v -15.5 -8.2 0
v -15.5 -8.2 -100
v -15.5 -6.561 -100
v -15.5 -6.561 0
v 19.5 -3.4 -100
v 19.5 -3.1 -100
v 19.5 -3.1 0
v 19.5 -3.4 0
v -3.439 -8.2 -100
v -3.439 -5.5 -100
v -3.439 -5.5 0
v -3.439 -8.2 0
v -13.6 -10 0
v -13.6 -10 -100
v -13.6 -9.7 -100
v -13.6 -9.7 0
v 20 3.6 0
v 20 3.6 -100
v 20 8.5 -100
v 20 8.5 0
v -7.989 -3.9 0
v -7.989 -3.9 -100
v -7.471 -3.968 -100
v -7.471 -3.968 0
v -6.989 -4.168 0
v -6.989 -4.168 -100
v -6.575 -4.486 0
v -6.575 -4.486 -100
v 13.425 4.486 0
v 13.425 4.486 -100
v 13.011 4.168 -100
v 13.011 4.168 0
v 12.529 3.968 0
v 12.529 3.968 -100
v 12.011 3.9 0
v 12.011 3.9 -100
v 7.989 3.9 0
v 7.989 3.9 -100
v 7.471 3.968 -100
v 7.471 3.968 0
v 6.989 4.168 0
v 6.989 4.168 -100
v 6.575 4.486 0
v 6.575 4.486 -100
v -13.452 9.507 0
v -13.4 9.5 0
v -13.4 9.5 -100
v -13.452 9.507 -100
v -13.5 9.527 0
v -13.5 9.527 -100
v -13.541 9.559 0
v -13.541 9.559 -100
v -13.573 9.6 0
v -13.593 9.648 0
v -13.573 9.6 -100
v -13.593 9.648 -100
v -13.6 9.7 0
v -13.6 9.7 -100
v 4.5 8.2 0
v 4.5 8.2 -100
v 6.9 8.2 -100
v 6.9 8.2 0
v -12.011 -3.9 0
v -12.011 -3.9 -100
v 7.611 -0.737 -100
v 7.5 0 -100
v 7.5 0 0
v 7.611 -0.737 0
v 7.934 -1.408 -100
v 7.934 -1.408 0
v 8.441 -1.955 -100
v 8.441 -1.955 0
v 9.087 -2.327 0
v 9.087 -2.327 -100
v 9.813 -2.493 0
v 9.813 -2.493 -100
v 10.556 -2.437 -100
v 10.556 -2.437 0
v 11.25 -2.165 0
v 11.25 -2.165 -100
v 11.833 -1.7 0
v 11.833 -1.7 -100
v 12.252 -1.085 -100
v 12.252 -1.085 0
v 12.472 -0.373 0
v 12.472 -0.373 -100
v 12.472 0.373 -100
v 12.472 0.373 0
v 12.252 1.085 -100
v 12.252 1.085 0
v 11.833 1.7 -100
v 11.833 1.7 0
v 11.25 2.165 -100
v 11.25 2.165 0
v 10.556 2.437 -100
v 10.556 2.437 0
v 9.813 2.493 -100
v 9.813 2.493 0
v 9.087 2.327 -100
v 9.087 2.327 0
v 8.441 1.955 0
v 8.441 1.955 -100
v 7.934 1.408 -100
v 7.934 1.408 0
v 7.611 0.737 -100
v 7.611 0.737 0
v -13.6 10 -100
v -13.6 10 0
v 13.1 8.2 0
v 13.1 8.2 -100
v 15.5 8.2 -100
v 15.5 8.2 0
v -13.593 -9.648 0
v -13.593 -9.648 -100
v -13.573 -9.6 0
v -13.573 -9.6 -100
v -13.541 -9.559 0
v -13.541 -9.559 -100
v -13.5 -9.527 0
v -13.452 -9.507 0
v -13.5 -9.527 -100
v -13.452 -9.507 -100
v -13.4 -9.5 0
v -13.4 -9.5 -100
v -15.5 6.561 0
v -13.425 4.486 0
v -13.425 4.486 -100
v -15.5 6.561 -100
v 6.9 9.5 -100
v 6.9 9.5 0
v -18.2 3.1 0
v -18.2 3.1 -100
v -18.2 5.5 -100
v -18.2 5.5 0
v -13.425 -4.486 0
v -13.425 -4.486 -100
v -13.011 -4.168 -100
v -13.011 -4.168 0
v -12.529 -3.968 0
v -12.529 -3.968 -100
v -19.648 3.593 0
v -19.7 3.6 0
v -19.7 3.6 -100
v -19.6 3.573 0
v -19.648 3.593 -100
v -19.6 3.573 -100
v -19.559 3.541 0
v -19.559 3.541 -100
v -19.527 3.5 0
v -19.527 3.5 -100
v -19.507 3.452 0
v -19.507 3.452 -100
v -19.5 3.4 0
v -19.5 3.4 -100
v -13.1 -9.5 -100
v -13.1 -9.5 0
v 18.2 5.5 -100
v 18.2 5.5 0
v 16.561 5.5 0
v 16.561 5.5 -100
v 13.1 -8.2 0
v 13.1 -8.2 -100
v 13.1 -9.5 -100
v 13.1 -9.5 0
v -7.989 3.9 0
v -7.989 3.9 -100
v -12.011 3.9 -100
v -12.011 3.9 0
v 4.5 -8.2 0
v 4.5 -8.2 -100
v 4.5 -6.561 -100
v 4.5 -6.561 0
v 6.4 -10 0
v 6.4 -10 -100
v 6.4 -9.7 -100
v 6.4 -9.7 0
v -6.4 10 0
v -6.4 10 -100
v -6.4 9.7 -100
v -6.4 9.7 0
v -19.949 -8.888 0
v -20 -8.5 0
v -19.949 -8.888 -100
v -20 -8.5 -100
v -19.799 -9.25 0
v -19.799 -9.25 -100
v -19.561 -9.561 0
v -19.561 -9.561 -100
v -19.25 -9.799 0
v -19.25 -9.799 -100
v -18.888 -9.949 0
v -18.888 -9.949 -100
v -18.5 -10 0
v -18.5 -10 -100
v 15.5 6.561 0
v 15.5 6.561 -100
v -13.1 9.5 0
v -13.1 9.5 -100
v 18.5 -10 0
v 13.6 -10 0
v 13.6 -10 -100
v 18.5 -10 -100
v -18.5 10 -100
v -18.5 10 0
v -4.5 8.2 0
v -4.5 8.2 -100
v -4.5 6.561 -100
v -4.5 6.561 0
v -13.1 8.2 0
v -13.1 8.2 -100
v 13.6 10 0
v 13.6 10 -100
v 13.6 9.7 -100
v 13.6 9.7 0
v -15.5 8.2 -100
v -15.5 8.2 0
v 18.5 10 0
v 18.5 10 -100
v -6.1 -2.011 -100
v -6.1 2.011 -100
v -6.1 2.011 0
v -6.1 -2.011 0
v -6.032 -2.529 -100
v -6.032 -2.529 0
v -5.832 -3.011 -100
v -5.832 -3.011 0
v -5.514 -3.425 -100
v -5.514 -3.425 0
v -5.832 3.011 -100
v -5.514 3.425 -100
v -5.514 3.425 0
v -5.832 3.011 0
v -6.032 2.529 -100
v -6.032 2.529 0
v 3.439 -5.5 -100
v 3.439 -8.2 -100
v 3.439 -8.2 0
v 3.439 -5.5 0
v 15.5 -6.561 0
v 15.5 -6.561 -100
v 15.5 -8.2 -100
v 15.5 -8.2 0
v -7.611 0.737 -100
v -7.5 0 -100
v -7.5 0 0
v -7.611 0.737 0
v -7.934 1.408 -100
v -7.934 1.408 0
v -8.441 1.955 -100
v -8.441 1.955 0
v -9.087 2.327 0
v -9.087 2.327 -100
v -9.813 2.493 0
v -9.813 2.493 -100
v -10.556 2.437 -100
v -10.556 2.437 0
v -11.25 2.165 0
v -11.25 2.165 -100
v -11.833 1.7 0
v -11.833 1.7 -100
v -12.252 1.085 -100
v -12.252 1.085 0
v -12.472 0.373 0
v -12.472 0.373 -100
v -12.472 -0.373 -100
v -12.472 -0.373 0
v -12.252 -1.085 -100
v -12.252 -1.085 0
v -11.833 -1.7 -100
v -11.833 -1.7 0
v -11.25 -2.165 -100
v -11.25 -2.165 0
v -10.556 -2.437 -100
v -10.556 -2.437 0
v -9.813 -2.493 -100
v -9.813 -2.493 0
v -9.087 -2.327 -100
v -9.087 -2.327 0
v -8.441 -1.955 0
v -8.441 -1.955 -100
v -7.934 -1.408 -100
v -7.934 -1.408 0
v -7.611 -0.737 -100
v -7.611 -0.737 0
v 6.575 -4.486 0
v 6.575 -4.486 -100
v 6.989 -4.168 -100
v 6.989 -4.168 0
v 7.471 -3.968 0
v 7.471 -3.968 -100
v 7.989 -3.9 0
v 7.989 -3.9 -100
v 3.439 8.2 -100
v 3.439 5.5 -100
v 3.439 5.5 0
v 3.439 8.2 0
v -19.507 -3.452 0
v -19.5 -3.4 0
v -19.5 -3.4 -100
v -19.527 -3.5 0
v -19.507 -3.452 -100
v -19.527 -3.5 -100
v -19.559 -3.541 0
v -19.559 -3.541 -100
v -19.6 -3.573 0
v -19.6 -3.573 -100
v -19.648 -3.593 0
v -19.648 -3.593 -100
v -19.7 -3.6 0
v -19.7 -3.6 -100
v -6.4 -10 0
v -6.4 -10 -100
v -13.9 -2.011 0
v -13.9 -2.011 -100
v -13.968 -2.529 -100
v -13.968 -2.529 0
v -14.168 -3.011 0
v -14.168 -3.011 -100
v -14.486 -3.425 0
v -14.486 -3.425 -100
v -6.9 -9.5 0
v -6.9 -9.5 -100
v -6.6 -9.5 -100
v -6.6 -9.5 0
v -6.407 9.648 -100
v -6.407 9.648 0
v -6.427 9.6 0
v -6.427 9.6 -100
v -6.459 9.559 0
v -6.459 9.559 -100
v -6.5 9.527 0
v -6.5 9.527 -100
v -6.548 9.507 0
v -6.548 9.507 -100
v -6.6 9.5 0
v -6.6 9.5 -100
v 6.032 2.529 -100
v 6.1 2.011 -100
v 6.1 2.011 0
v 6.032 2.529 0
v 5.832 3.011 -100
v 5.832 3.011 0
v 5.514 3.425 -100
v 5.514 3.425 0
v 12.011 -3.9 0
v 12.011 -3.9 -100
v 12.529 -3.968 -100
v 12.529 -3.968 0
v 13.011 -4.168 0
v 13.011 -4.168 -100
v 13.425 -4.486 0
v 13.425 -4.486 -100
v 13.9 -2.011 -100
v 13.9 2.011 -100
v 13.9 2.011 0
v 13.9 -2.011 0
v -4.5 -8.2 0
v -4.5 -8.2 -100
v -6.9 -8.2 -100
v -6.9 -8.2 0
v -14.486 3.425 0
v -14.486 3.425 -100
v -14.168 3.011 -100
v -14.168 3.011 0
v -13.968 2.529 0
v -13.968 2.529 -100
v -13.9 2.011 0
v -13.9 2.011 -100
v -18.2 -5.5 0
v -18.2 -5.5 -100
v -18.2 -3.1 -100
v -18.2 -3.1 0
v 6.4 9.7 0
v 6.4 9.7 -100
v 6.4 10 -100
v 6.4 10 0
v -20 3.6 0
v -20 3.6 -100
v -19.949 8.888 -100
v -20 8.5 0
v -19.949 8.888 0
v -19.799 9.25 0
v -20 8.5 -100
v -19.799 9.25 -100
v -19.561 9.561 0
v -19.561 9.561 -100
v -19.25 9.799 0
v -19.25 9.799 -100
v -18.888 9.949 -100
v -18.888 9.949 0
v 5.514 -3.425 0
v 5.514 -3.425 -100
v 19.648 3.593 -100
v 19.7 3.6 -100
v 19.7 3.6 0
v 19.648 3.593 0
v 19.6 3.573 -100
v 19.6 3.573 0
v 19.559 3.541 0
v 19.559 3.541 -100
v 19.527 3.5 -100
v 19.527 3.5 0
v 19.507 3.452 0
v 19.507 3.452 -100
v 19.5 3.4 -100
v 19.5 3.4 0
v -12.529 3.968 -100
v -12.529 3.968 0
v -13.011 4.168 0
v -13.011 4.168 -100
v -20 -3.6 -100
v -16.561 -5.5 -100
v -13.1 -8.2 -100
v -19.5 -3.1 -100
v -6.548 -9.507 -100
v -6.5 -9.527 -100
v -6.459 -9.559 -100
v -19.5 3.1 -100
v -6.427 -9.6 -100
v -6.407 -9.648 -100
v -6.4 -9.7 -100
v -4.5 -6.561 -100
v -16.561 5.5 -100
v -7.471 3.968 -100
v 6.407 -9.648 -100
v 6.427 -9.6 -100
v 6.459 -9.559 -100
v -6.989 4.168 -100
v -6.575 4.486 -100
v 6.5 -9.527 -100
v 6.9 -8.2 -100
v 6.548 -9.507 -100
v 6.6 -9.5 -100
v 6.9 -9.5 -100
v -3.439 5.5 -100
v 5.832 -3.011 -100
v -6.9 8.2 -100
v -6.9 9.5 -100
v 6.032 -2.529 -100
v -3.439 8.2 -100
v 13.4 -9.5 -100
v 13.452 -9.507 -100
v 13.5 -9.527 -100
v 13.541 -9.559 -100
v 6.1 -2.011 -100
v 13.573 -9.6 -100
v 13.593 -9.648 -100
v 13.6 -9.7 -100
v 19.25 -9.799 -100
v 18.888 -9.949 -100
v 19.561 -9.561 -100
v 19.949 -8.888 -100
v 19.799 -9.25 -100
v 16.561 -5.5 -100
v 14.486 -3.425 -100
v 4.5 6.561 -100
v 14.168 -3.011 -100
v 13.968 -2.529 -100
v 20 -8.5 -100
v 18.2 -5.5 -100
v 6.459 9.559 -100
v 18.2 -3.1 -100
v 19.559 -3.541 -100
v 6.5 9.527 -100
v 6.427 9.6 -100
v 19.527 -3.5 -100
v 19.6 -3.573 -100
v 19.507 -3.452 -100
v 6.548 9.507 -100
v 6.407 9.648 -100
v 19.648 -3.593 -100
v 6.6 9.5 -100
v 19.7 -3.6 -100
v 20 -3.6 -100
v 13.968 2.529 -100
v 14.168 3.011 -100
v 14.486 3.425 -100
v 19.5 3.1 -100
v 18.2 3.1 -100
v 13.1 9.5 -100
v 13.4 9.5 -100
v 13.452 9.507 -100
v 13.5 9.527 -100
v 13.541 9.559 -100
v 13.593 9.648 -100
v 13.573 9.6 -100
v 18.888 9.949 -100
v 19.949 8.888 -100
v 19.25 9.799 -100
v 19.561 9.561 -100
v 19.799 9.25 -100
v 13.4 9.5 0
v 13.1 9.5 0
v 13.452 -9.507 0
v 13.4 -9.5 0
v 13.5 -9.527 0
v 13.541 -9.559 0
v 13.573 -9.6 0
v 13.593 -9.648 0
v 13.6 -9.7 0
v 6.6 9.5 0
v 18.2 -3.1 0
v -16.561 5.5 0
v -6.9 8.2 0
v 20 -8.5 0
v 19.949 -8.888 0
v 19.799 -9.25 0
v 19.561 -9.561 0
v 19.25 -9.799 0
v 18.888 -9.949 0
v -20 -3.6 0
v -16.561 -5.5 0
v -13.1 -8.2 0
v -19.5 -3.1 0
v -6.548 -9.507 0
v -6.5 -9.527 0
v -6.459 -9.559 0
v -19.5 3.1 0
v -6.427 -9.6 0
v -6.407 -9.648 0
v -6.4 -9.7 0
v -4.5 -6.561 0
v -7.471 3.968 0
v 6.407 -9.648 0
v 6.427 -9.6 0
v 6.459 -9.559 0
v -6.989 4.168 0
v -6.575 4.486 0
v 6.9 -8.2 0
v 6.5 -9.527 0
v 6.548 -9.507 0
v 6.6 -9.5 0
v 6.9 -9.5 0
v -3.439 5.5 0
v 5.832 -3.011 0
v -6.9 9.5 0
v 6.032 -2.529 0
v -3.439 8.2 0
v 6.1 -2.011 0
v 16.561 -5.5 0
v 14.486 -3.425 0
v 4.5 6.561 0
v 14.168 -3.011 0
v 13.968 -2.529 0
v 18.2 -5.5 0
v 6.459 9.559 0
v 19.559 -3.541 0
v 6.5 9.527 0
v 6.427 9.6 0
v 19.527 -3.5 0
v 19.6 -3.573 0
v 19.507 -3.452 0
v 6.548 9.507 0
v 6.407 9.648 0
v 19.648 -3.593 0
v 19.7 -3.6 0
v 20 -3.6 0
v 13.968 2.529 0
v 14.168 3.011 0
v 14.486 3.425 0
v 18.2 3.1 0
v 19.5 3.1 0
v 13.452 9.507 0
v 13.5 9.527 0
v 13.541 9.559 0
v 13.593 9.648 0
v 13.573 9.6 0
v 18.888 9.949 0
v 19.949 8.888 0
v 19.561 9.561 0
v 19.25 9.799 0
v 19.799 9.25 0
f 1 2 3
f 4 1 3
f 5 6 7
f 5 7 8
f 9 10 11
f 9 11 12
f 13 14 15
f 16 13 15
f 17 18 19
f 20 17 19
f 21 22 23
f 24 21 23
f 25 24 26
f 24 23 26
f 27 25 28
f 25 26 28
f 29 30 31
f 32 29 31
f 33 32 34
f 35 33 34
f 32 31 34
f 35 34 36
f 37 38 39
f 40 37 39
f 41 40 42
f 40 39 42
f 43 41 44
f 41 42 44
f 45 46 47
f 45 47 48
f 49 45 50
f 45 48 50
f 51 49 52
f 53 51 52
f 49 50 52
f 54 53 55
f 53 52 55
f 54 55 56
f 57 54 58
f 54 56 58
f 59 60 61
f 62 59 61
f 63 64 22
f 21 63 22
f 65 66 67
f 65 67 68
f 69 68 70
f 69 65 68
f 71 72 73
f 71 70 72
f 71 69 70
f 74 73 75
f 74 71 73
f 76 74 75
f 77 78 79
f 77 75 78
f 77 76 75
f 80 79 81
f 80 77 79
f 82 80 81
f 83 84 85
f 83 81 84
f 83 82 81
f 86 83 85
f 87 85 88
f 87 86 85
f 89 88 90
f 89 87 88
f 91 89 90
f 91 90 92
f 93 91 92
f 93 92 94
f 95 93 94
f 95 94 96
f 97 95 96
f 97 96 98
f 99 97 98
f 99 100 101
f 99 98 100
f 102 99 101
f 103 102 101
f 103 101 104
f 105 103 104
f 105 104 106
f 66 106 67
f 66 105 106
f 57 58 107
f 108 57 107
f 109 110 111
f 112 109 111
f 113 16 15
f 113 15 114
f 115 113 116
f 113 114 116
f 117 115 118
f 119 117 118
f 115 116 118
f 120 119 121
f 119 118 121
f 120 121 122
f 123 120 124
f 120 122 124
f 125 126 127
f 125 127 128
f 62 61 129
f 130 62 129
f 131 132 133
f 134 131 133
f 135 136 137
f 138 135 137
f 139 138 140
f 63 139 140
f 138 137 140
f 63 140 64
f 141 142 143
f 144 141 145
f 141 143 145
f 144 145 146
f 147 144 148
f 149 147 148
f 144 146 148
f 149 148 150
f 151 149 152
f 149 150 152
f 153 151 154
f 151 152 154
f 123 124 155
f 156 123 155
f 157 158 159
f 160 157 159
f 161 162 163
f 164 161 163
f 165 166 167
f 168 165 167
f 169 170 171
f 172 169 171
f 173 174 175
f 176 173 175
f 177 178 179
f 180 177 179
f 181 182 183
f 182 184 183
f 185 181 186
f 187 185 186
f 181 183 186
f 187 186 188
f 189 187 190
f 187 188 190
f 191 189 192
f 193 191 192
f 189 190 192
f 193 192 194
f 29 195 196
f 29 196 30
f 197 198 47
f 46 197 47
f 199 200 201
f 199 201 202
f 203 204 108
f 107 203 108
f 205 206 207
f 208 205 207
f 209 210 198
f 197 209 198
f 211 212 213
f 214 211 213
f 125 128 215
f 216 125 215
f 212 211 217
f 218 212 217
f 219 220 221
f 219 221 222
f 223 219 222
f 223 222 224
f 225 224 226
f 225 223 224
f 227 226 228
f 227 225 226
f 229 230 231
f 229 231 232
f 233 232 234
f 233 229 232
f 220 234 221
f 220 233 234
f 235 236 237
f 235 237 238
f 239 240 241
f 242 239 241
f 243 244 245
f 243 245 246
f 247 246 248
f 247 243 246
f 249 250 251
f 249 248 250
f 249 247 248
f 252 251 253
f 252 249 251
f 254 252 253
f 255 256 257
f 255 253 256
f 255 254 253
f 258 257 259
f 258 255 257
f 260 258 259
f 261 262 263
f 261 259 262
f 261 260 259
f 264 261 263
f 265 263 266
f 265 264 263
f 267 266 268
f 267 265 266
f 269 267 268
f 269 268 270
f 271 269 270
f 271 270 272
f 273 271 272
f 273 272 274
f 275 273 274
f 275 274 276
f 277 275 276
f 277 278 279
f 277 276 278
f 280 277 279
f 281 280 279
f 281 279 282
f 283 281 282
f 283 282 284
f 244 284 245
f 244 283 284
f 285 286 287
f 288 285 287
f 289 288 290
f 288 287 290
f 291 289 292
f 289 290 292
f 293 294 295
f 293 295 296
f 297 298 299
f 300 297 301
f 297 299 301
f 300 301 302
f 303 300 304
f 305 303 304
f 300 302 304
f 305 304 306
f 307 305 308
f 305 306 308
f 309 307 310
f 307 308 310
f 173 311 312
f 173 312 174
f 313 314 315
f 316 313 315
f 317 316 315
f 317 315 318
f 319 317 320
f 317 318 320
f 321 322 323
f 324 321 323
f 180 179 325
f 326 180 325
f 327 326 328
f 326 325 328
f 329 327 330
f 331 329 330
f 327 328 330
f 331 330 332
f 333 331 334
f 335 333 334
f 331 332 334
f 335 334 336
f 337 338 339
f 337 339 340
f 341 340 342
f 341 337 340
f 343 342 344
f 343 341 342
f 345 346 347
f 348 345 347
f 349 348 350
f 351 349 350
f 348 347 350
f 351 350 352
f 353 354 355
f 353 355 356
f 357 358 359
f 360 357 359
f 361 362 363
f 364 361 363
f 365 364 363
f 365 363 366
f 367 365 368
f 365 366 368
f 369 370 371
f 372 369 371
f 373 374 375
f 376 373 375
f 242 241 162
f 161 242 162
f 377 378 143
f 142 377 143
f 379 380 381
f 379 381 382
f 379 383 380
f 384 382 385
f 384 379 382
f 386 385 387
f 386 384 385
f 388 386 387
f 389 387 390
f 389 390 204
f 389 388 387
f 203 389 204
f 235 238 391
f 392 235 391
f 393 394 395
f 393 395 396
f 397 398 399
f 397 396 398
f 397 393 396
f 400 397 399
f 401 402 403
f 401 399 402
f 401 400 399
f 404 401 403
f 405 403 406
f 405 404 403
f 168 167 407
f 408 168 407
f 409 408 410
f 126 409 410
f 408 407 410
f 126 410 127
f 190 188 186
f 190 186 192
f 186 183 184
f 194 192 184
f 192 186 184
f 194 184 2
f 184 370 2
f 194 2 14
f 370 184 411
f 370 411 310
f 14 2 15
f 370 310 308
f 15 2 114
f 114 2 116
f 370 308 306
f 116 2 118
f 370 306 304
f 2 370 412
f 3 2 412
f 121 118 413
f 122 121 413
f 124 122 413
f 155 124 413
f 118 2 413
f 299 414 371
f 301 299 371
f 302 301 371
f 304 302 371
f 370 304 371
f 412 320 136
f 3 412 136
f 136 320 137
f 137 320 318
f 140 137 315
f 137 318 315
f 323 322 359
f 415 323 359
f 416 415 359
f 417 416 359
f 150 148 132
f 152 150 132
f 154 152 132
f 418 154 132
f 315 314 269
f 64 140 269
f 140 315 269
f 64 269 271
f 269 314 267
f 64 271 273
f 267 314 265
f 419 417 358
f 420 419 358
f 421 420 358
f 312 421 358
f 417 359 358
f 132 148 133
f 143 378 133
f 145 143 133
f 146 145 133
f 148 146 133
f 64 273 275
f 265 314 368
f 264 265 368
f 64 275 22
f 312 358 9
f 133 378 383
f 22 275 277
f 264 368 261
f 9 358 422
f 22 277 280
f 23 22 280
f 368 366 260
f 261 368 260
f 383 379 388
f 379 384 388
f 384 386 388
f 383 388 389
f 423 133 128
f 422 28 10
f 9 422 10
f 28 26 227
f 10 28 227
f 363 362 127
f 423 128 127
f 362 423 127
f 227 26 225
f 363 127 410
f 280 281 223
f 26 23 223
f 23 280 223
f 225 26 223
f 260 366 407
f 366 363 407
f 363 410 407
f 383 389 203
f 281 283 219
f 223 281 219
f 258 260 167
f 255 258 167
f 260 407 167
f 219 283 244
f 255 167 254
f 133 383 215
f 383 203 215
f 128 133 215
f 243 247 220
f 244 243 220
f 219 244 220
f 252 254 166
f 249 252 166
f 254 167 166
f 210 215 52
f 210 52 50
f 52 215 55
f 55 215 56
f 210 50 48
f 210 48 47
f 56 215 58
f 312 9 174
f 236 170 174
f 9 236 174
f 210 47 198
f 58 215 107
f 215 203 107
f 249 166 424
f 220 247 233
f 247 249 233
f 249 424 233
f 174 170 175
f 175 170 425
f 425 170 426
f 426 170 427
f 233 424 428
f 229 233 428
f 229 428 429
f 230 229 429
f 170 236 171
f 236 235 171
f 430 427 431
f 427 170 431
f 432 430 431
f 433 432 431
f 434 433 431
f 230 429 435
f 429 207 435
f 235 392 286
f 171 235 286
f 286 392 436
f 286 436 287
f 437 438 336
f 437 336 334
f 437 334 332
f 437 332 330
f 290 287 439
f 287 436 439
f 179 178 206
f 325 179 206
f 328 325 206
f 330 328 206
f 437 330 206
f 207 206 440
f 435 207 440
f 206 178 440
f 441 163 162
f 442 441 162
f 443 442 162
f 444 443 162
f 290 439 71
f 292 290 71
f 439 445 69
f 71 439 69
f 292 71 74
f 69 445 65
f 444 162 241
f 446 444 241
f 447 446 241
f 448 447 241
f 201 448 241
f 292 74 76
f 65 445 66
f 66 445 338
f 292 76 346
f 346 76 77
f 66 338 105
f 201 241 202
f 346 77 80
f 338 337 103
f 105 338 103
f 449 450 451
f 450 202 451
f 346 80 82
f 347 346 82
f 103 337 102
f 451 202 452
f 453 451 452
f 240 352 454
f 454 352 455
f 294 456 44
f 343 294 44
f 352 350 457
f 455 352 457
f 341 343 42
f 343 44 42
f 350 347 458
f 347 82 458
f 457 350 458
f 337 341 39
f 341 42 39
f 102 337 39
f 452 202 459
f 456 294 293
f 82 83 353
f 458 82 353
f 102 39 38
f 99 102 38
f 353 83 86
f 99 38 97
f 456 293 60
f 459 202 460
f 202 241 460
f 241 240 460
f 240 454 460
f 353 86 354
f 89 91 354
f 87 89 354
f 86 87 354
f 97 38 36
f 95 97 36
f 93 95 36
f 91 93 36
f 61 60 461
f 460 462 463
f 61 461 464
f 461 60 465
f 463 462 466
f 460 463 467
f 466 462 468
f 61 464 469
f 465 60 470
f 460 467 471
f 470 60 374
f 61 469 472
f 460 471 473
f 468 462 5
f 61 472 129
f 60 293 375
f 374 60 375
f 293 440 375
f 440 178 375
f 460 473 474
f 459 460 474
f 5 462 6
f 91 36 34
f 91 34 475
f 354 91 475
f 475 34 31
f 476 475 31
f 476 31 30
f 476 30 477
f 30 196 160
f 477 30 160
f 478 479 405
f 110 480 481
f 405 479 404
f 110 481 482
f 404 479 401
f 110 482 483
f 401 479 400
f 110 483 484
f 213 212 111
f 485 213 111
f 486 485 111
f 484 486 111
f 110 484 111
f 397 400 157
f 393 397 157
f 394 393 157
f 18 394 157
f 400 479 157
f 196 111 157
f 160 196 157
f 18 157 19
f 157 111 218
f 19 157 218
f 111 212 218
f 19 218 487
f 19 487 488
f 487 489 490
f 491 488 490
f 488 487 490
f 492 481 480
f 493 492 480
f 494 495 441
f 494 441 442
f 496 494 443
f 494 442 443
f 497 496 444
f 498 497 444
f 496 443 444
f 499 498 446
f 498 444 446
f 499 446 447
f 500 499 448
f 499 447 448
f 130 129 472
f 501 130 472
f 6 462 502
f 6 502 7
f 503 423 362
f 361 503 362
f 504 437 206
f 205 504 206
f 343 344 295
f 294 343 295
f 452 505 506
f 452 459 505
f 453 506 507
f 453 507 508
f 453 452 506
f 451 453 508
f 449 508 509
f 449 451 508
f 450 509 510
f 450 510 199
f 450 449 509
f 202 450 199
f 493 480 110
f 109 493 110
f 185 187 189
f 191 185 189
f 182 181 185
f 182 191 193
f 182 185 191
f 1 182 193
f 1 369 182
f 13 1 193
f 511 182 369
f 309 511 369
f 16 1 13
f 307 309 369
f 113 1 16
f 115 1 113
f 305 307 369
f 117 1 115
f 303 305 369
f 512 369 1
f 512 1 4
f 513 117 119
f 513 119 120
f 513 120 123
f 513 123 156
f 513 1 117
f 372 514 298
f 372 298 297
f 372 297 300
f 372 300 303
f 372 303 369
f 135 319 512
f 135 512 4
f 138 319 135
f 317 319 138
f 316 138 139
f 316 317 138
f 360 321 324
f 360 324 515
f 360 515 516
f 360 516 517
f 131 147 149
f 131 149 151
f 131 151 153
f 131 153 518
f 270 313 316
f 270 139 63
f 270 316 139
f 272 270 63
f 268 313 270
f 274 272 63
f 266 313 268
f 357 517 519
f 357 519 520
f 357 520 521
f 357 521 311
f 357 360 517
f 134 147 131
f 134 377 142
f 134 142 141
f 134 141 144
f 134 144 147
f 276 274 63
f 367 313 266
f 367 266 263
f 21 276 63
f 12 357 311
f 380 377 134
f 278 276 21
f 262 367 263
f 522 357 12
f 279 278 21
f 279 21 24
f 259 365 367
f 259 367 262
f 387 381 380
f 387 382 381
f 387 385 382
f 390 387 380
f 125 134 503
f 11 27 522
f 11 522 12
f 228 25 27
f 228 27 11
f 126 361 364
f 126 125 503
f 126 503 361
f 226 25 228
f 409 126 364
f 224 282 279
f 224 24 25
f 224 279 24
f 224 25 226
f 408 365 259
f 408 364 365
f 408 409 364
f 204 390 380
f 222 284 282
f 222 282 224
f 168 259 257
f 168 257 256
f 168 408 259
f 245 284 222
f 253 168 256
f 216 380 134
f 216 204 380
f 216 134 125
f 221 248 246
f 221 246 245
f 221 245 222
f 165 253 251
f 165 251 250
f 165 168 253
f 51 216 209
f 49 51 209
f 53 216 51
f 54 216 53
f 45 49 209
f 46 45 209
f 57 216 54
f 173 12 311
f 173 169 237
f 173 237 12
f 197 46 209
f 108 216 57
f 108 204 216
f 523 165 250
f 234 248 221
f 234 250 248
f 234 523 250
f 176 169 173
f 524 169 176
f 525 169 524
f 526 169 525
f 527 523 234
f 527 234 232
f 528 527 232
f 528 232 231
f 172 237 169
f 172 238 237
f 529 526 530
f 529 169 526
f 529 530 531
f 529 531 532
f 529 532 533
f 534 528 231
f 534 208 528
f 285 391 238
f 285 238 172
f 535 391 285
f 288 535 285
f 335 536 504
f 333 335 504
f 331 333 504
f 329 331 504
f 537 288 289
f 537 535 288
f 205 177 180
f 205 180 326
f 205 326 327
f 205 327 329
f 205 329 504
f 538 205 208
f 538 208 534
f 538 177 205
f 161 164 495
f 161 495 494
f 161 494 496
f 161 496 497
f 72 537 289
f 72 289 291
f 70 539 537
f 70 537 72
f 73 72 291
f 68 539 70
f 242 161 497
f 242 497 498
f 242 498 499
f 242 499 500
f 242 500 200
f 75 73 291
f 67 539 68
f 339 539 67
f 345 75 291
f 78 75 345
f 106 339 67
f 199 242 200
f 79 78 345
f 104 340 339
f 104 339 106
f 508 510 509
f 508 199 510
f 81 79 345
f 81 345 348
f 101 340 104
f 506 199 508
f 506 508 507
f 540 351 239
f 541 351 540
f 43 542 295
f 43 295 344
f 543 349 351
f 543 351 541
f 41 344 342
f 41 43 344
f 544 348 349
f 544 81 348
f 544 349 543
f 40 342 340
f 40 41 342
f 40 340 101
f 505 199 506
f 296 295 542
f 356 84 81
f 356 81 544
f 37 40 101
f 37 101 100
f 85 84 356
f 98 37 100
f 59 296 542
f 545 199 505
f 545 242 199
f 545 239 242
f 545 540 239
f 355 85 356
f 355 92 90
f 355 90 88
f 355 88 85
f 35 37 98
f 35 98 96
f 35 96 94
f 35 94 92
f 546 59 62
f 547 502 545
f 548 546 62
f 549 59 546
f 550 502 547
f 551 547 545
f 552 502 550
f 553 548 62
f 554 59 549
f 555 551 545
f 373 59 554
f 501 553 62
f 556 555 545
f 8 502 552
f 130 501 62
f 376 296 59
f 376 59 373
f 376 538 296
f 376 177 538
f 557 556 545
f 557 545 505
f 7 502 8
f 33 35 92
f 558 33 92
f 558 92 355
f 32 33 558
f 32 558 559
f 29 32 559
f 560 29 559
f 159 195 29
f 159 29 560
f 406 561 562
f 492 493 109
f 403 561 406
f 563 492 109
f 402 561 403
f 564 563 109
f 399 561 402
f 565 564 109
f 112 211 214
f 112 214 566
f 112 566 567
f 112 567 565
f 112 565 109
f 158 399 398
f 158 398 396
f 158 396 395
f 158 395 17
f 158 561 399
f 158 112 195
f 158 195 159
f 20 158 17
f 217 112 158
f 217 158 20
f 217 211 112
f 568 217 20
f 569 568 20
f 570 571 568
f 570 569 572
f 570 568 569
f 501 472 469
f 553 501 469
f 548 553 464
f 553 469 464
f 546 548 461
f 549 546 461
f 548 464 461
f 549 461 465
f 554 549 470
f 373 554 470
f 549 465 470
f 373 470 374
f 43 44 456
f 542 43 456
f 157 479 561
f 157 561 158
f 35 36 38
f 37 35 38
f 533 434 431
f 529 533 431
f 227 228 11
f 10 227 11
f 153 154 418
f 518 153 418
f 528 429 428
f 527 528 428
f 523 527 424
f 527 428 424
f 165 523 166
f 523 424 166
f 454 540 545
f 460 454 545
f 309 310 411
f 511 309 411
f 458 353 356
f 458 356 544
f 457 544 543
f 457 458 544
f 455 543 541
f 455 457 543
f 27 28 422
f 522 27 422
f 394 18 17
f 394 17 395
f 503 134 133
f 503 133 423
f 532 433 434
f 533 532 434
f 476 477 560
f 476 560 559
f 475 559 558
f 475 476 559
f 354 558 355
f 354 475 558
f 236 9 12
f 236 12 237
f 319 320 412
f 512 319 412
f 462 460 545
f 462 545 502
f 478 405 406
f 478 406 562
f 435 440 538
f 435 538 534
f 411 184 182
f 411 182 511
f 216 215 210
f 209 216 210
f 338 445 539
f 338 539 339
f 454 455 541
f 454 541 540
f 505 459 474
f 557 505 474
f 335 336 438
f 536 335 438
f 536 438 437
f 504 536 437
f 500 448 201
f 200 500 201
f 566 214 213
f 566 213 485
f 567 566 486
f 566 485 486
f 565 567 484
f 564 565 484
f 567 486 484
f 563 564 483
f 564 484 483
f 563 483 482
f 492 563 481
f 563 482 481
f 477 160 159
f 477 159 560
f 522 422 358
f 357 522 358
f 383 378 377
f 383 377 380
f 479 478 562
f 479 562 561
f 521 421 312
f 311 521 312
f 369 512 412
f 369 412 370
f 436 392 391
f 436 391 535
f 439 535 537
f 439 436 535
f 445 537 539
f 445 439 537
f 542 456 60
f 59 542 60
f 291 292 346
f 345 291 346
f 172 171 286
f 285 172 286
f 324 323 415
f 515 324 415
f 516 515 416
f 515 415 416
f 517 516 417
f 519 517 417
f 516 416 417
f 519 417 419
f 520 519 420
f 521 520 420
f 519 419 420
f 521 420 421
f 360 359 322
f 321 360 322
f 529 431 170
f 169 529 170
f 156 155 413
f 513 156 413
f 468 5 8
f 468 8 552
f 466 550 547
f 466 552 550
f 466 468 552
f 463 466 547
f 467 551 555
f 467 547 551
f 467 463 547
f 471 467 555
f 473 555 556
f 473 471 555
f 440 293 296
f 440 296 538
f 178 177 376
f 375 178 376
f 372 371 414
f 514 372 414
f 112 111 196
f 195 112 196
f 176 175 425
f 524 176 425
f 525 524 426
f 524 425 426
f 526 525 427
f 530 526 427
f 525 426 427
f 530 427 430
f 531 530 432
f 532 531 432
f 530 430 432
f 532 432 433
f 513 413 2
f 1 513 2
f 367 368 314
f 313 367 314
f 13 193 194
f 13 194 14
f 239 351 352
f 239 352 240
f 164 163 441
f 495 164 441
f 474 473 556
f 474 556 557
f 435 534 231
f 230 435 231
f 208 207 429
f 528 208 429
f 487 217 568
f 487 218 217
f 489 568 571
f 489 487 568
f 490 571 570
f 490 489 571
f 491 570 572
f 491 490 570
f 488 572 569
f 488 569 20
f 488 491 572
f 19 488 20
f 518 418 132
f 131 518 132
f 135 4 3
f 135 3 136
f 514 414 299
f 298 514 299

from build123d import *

# Parameters (mm, degrees)
SKETCH2_W               = 40
SKETCH2_H               = 20
BOSS_EXTRUDE1_DEPTH     = 100
CUT_EXTRUDE1_DEPTH      = 103.46950766
CUT_EXTRUDE1_DEPTH_BACK = 103.46950766
SKETCH3_R               = 2.5
FILLET1_R               = 1.5


with BuildPart() as part:
    # Sketch2 → Boss-Extrude1 (new body)
    with BuildSketch(Plane.XY):
        Rectangle(SKETCH2_W, SKETCH2_H)
    extrude(amount=-BOSS_EXTRUDE1_DEPTH)

    # Sketch3 → Cut-Extrude1 (cut, two sides: drawn at the far end of the back side and taken through both)
    with BuildSketch(Plane.XY.offset(-CUT_EXTRUDE1_DEPTH_BACK)):
        with Locations((-10, 0)):
            Circle(SKETCH3_R)
        with Locations(Location((10, 0, 0), (0, 0, 180))):
            Circle(SKETCH3_R)
        with BuildLine():
            Line((-13.6, 10), (-6.4, 10))
            Line((-6.4, 10), (-6.4, 9.7))
            ThreePointArc((-6.4, 9.7), (-6.458578644, 9.558578644), (-6.6, 9.5))
            Line((-6.6, 9.5), (-6.9, 9.5))
            Line((-6.9, 9.5), (-6.9, 8.2))
            Line((-6.9, 8.2), (-4.5, 8.2))
            Line((-4.5, 8.2), (-4.5, 6.560660172))
            Line((-4.5, 6.560660172), (-6.574873734, 4.485786438))
            ThreePointArc((-6.574873734, 4.485786438), (-7.223720432, 4.052240935), (-7.989087297, 3.9))
            Line((-7.989087297, 3.9), (-12.010912703, 3.9))
            ThreePointArc((-12.010912703, 3.9), (-12.776279568, 4.052240935), (-13.425126266, 4.485786438))
            Line((-13.425126266, 4.485786438), (-15.5, 6.560660172))
            Line((-15.5, 6.560660172), (-15.5, 8.2))
            Line((-15.5, 8.2), (-13.1, 8.2))
            Line((-13.1, 8.2), (-13.1, 9.5))
            Line((-13.1, 9.5), (-13.4, 9.5))
            ThreePointArc((-13.4, 9.5), (-13.541421356, 9.558578644), (-13.6, 9.7))
            Line((-13.6, 9.7), (-13.6, 10))
        make_face()
        with BuildLine():
            Line((-13.6, -10), (-13.6, -9.7))
            ThreePointArc((-13.6, -9.7), (-13.541421356, -9.558578644), (-13.4, -9.5))
            Line((-13.4, -9.5), (-13.1, -9.5))
            Line((-13.1, -9.5), (-13.1, -8.2))
            Line((-13.1, -8.2), (-15.5, -8.2))
            Line((-15.5, -8.2), (-15.5, -6.560660172))
            Line((-15.5, -6.560660172), (-13.425126266, -4.485786438))
            ThreePointArc((-13.425126266, -4.485786438), (-12.776279568, -4.052240935), (-12.010912703, -3.9))
            Line((-12.010912703, -3.9), (-7.989087297, -3.9))
            ThreePointArc((-7.989087297, -3.9), (-7.223720432, -4.052240935), (-6.574873734, -4.485786438))
            Line((-6.574873734, -4.485786438), (-4.5, -6.560660172))
            Line((-4.5, -6.560660172), (-4.5, -8.2))
            Line((-4.5, -8.2), (-6.9, -8.2))
            Line((-6.9, -8.2), (-6.9, -9.5))
            Line((-6.9, -9.5), (-6.6, -9.5))
            ThreePointArc((-6.6, -9.5), (-6.458578644, -9.558578644), (-6.4, -9.7))
            Line((-6.4, -9.7), (-6.4, -10))
            Line((-6.4, -10), (-13.6, -10))
        make_face()
        with BuildLine():
            Line((13.6, -10), (6.4, -10))
            Line((6.4, -10), (6.4, -9.7))
            ThreePointArc((6.4, -9.7), (6.458578644, -9.558578644), (6.6, -9.5))
            Line((6.6, -9.5), (6.9, -9.5))
            Line((6.9, -9.5), (6.9, -8.2))
            Line((6.9, -8.2), (4.5, -8.2))
            Line((4.5, -8.2), (4.5, -6.560660172))
            Line((4.5, -6.560660172), (6.574873734, -4.485786438))
            ThreePointArc((6.574873734, -4.485786438), (7.223720432, -4.052240935), (7.989087297, -3.9))
            Line((7.989087297, -3.9), (12.010912703, -3.9))
            ThreePointArc((12.010912703, -3.9), (12.776279568, -4.052240935), (13.425126266, -4.485786438))
            Line((13.425126266, -4.485786438), (15.5, -6.560660172))
            Line((15.5, -6.560660172), (15.5, -8.2))
            Line((15.5, -8.2), (13.1, -8.2))
            Line((13.1, -8.2), (13.1, -9.5))
            Line((13.1, -9.5), (13.4, -9.5))
            ThreePointArc((13.4, -9.5), (13.541421356, -9.558578644), (13.6, -9.7))
            Line((13.6, -9.7), (13.6, -10))
        make_face()
        with BuildLine():
            Line((13.6, 10), (13.6, 9.7))
            ThreePointArc((13.6, 9.7), (13.541421356, 9.558578644), (13.4, 9.5))
            Line((13.4, 9.5), (13.1, 9.5))
            Line((13.1, 9.5), (13.1, 8.2))
            Line((13.1, 8.2), (15.5, 8.2))
            Line((15.5, 8.2), (15.5, 6.560660172))
            Line((15.5, 6.560660172), (13.425126266, 4.485786438))
            ThreePointArc((13.425126266, 4.485786438), (12.776279568, 4.052240935), (12.010912703, 3.9))
            Line((12.010912703, 3.9), (7.989087297, 3.9))
            ThreePointArc((7.989087297, 3.9), (7.223720432, 4.052240935), (6.574873734, 4.485786438))
            Line((6.574873734, 4.485786438), (4.5, 6.560660172))
            Line((4.5, 6.560660172), (4.5, 8.2))
            Line((4.5, 8.2), (6.9, 8.2))
            Line((6.9, 8.2), (6.9, 9.5))
            Line((6.9, 9.5), (6.6, 9.5))
            ThreePointArc((6.6, 9.5), (6.458578644, 9.558578644), (6.4, 9.7))
            Line((6.4, 9.7), (6.4, 10))
            Line((6.4, 10), (13.6, 10))
        make_face()
        with BuildLine():
            Line((-16.560660172, -5.5), (-18.2, -5.5))
            Line((-18.2, -5.5), (-18.2, -3.1))
            Line((-18.2, -3.1), (-19.5, -3.1))
            Line((-19.5, -3.1), (-19.5, -3.4))
            ThreePointArc((-19.5, -3.4), (-19.558578644, -3.541421356), (-19.7, -3.6))
            Line((-19.7, -3.6), (-20, -3.6))
            Line((-20, -3.6), (-20, 3.6))
            Line((-20, 3.6), (-19.7, 3.6))
            ThreePointArc((-19.7, 3.6), (-19.558578644, 3.541421356), (-19.5, 3.4))
            Line((-19.5, 3.4), (-19.5, 3.1))
            Line((-19.5, 3.1), (-18.2, 3.1))
            Line((-18.2, 3.1), (-18.2, 5.5))
            Line((-18.2, 5.5), (-16.560660172, 5.5))
            Line((-16.560660172, 5.5), (-14.485786438, 3.425126266))
            ThreePointArc((-14.485786438, 3.425126266), (-14.052240935, 2.776279568), (-13.9, 2.010912703))
            Line((-13.9, 2.010912703), (-13.9, -2.010912703))
            ThreePointArc((-13.9, -2.010912703), (-14.052240935, -2.776279568), (-14.485786438, -3.425126266))
            Line((-14.485786438, -3.425126266), (-16.560660172, -5.5))
        make_face()
        with BuildLine():
            Line((14.485786438, -3.425126266), (16.560660172, -5.5))
            Line((16.560660172, -5.5), (18.2, -5.5))
            Line((18.2, -5.5), (18.2, -3.1))
            Line((18.2, -3.1), (19.5, -3.1))
            Line((19.5, -3.1), (19.5, -3.4))
            ThreePointArc((19.5, -3.4), (19.558578644, -3.541421356), (19.7, -3.6))
            Line((19.7, -3.6), (20, -3.6))
            Line((20, -3.6), (20, 3.6))
            Line((20, 3.6), (19.7, 3.6))
            ThreePointArc((19.7, 3.6), (19.558578644, 3.541421356), (19.5, 3.4))
            Line((19.5, 3.4), (19.5, 3.1))
            Line((19.5, 3.1), (18.2, 3.1))
            Line((18.2, 3.1), (18.2, 5.5))
            Line((18.2, 5.5), (16.560660172, 5.5))
            Line((16.560660172, 5.5), (14.485786438, 3.425126266))
            ThreePointArc((14.485786438, 3.425126266), (14.052240935, 2.776279568), (13.9, 2.010912703))
            Line((13.9, 2.010912703), (13.9, -2.010912703))
            ThreePointArc((13.9, -2.010912703), (14.052240935, -2.776279568), (14.485786438, -3.425126266))
        make_face()
        with BuildLine():
            Line((-3.439339828, 8.2), (-3.439339828, 5.5))
            Line((-3.439339828, 5.5), (-5.514213562, 3.425126266))
            ThreePointArc((-5.514213562, 3.425126266), (-5.947759065, 2.776279568), (-6.1, 2.010912703))
            Line((-6.1, 2.010912703), (-6.1, -2.010912703))
            ThreePointArc((-6.1, -2.010912703), (-5.947759065, -2.776279568), (-5.514213562, -3.425126266))
            Line((-5.514213562, -3.425126266), (-3.439339828, -5.5))
            Line((-3.439339828, -5.5), (-3.439339828, -8.2))
            Line((-3.439339828, -8.2), (3.439339828, -8.2))
            Line((3.439339828, -8.2), (3.439339828, -5.5))
            Line((3.439339828, -5.5), (5.514213562, -3.425126266))
            ThreePointArc((5.514213562, -3.425126266), (5.947759065, -2.776279568), (6.1, -2.010912703))
            Line((6.1, -2.010912703), (6.1, 2.010912703))
            ThreePointArc((6.1, 2.010912703), (5.947759065, 2.776279568), (5.514213562, 3.425126266))
            Line((5.514213562, 3.425126266), (3.439339828, 5.5))
            Line((3.439339828, 5.5), (3.439339828, 8.2))
            Line((3.439339828, 8.2), (-3.439339828, 8.2))
        make_face()
    extrude(amount=CUT_EXTRUDE1_DEPTH + CUT_EXTRUDE1_DEPTH_BACK, mode=Mode.SUBTRACT)

    # Fillet1
    fillet1_edges = [part.edges().sort_by_distance(p)[0] for p in [
        (20, -10, -50),
        (-20, -10, -50),
        (-20, 10, -50),
        (20, 10, -50),
    ]]
    fillet(fillet1_edges, radius=FILLET1_R)


solid = part.part
